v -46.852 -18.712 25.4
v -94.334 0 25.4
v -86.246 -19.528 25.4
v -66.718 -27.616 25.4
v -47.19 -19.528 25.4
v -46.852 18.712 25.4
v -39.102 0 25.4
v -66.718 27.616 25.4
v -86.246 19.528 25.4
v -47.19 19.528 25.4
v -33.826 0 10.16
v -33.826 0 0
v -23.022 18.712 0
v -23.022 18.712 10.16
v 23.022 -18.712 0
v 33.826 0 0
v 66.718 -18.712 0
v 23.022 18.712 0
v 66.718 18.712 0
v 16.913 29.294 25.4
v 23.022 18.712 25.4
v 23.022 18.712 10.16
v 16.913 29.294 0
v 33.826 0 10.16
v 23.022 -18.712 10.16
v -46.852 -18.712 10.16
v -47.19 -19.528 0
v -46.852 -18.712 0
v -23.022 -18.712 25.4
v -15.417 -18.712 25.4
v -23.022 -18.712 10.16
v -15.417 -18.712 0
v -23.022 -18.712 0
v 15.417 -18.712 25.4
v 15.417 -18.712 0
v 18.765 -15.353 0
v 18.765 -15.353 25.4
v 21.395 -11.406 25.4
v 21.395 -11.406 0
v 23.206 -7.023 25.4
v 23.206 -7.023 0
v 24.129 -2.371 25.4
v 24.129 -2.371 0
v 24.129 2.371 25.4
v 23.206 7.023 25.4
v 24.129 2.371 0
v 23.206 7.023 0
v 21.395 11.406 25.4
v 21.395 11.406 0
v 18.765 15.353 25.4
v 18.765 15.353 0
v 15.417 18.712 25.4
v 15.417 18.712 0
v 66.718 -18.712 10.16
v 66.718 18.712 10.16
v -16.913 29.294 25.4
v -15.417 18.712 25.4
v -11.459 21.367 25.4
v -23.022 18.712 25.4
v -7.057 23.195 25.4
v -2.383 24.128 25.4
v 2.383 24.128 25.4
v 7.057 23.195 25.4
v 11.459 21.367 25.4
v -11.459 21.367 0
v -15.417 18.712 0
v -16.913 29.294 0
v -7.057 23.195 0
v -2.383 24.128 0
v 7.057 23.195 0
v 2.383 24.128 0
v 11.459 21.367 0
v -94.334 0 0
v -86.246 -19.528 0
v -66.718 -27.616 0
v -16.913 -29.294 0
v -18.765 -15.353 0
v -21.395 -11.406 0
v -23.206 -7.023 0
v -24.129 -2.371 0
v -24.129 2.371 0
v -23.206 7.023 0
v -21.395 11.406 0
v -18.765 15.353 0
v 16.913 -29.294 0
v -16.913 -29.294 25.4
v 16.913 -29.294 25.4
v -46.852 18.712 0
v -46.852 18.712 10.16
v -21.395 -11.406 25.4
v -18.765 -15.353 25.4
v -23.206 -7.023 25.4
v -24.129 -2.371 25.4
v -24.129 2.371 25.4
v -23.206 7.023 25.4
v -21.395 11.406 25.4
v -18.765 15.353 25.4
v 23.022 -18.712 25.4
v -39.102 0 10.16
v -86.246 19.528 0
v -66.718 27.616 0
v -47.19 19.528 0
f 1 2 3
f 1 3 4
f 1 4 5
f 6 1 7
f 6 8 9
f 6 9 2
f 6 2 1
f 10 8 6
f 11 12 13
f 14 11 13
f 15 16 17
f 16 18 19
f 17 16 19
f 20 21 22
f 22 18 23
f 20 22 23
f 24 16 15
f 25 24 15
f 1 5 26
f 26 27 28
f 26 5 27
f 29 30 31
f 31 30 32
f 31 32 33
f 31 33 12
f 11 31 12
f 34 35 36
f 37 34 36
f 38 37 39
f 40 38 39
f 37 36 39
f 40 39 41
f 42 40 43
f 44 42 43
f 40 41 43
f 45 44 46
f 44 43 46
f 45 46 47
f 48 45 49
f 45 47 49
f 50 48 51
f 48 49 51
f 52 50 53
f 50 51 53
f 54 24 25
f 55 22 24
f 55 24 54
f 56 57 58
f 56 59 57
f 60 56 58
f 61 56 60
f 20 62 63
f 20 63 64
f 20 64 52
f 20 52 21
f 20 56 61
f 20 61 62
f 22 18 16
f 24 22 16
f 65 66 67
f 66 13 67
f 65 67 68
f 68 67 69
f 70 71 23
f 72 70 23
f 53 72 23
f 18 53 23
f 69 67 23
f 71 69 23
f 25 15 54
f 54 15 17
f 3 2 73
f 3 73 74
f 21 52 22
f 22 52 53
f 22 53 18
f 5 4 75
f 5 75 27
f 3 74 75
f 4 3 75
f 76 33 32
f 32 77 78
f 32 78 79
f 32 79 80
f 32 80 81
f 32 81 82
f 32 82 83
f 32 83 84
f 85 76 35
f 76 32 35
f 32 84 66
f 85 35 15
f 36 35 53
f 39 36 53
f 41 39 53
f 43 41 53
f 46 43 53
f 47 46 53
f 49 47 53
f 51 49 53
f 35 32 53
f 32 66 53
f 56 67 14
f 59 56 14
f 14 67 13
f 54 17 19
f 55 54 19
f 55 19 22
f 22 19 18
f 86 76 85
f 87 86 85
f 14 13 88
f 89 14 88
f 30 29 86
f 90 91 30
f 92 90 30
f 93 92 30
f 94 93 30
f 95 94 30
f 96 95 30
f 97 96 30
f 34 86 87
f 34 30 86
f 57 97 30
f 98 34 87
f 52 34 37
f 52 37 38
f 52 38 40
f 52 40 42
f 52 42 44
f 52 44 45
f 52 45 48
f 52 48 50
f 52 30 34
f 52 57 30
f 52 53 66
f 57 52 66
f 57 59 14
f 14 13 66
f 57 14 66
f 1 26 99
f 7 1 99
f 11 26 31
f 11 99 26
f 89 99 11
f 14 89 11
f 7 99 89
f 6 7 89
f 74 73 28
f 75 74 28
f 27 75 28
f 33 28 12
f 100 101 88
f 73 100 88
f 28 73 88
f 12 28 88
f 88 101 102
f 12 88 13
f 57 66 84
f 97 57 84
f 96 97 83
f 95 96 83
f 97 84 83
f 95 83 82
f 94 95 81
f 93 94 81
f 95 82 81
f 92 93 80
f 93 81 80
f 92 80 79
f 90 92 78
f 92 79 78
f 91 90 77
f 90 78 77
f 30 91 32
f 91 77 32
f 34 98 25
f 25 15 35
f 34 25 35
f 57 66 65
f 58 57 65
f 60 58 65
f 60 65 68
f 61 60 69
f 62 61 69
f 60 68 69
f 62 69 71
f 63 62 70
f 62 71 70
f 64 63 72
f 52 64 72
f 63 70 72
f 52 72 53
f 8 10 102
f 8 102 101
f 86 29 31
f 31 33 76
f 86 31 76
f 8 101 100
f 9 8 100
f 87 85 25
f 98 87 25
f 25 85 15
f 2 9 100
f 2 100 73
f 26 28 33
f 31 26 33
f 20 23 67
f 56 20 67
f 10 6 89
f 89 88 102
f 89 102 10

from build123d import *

# Parameters (mm, degrees)
F1_DEPTH = 10.16
F2_DEPTH = 25.4


with BuildPart() as f1:
    # F0 (on Top) → F1 (new body)
    with BuildSketch(Plane.XY):
        Polygon((-46.8524309846, -18.7120158225), (-23.0223919256, -18.7120158225), (-33.8257792978, 0), (-39.1016602516, 0), align=None)
        Polygon((-33.8257792978, 0), (-23.0223919256, 18.7120158225), (-46.8524309846, 18.7120158225), (-39.1016602516, 0), align=None)
    extrude(amount=F1_DEPTH)



with BuildPart() as f1b:
    # F0 (on Top) → F1, piece 2 (new body)
    with BuildSketch(Plane.XY):
        Polygon((66.7180120945, 18.7120158225), (23.0223919256, 18.7120158225), (33.8257792978, 0), (23.0223919256, -18.7120158225), (66.7180120945, -18.7120158225), align=None)
    extrude(amount=F1_DEPTH)


with BuildPart() as f1_1:
    add(f1.part)

    add(f1b.part)  # F2 merges F1b
    # F0 (on Top) → F2 (join)
    with BuildSketch(Plane.XY):
        Polygon((-47.1903024348, -19.5277096597), (-46.8524309846, -18.7120158225), (-39.1016602516, 0), (-94.0762732549, 0), (-94.3343639374, 0), (-86.2457217542, -19.5277096597), (-66.7180120945, -27.6163518429), align=None)
        Polygon((-39.1016602516, 0), (-46.8524309846, 18.7120158225), (-47.1903024348, 19.5277096597), (-66.7180120945, 27.6163518429), (-86.2457217542, 19.5277096597), (-94.3343639374, 0), (-94.0762732549, 0), align=None)
        with BuildLine():
            ThreePointArc((15.4173678053, -18.7120158225), (21.9275344664, -10.3449503823), (24.2453040028, 0))
            ThreePointArc((24.2453040028, 0), (21.9275344664, 10.3449503823), (15.4173678053, 18.7120158225))
            Line((15.4173678053, 18.7120158225), (-15.4173678053, 18.7120158225))
            ThreePointArc((-15.4173678053, 18.7120158225), (-21.9275344664, 10.3449503823), (-24.2453040028, 0))
            ThreePointArc((-24.2453040028, 0), (-21.9275344664, -10.3449503823), (-15.4173678053, -18.7120158225))
            Line((-15.4173678053, -18.7120158225), (15.4173678053, -18.7120158225))
        make_face()
        with BuildLine():
            ThreePointArc((-15.4173678053, -18.7120158225), (0, -24.2453040028), (15.4173678053, -18.7120158225))
            Line((15.4173678053, -18.7120158225), (-15.4173678053, -18.7120158225))
        make_face()
        with BuildLine():
            Line((23.0223919256, -18.7120158225), (15.4173678053, -18.7120158225))
            ThreePointArc((15.4173678053, -18.7120158225), (0, -24.2453040028), (-15.4173678053, -18.7120158225))
            Line((-15.4173678053, -18.7120158225), (-23.0223919256, -18.7120158225))
            Line((-23.0223919256, -18.7120158225), (-16.9128896489, -29.2939841747))
            Line((-16.9128896489, -29.2939841747), (16.9128896489, -29.2939841747))
            Line((16.9128896489, -29.2939841747), (23.0223919256, -18.7120158225))
        make_face()
        with BuildLine():
            ThreePointArc((-15.4173678053, 18.7120158225), (0, 24.2453040028), (15.4173678053, 18.7120158225))
            Line((15.4173678053, 18.7120158225), (23.0223919256, 18.7120158225))
            Line((23.0223919256, 18.7120158225), (16.9128896489, 29.2939841747))
            Line((16.9128896489, 29.2939841747), (-16.9128896489, 29.2939841747))
            Line((-16.9128896489, 29.2939841747), (-23.0223919256, 18.7120158225))
            Line((-23.0223919256, 18.7120158225), (-15.4173678053, 18.7120158225))
        make_face()
    extrude(amount=F2_DEPTH)


solid = f1_1.part
